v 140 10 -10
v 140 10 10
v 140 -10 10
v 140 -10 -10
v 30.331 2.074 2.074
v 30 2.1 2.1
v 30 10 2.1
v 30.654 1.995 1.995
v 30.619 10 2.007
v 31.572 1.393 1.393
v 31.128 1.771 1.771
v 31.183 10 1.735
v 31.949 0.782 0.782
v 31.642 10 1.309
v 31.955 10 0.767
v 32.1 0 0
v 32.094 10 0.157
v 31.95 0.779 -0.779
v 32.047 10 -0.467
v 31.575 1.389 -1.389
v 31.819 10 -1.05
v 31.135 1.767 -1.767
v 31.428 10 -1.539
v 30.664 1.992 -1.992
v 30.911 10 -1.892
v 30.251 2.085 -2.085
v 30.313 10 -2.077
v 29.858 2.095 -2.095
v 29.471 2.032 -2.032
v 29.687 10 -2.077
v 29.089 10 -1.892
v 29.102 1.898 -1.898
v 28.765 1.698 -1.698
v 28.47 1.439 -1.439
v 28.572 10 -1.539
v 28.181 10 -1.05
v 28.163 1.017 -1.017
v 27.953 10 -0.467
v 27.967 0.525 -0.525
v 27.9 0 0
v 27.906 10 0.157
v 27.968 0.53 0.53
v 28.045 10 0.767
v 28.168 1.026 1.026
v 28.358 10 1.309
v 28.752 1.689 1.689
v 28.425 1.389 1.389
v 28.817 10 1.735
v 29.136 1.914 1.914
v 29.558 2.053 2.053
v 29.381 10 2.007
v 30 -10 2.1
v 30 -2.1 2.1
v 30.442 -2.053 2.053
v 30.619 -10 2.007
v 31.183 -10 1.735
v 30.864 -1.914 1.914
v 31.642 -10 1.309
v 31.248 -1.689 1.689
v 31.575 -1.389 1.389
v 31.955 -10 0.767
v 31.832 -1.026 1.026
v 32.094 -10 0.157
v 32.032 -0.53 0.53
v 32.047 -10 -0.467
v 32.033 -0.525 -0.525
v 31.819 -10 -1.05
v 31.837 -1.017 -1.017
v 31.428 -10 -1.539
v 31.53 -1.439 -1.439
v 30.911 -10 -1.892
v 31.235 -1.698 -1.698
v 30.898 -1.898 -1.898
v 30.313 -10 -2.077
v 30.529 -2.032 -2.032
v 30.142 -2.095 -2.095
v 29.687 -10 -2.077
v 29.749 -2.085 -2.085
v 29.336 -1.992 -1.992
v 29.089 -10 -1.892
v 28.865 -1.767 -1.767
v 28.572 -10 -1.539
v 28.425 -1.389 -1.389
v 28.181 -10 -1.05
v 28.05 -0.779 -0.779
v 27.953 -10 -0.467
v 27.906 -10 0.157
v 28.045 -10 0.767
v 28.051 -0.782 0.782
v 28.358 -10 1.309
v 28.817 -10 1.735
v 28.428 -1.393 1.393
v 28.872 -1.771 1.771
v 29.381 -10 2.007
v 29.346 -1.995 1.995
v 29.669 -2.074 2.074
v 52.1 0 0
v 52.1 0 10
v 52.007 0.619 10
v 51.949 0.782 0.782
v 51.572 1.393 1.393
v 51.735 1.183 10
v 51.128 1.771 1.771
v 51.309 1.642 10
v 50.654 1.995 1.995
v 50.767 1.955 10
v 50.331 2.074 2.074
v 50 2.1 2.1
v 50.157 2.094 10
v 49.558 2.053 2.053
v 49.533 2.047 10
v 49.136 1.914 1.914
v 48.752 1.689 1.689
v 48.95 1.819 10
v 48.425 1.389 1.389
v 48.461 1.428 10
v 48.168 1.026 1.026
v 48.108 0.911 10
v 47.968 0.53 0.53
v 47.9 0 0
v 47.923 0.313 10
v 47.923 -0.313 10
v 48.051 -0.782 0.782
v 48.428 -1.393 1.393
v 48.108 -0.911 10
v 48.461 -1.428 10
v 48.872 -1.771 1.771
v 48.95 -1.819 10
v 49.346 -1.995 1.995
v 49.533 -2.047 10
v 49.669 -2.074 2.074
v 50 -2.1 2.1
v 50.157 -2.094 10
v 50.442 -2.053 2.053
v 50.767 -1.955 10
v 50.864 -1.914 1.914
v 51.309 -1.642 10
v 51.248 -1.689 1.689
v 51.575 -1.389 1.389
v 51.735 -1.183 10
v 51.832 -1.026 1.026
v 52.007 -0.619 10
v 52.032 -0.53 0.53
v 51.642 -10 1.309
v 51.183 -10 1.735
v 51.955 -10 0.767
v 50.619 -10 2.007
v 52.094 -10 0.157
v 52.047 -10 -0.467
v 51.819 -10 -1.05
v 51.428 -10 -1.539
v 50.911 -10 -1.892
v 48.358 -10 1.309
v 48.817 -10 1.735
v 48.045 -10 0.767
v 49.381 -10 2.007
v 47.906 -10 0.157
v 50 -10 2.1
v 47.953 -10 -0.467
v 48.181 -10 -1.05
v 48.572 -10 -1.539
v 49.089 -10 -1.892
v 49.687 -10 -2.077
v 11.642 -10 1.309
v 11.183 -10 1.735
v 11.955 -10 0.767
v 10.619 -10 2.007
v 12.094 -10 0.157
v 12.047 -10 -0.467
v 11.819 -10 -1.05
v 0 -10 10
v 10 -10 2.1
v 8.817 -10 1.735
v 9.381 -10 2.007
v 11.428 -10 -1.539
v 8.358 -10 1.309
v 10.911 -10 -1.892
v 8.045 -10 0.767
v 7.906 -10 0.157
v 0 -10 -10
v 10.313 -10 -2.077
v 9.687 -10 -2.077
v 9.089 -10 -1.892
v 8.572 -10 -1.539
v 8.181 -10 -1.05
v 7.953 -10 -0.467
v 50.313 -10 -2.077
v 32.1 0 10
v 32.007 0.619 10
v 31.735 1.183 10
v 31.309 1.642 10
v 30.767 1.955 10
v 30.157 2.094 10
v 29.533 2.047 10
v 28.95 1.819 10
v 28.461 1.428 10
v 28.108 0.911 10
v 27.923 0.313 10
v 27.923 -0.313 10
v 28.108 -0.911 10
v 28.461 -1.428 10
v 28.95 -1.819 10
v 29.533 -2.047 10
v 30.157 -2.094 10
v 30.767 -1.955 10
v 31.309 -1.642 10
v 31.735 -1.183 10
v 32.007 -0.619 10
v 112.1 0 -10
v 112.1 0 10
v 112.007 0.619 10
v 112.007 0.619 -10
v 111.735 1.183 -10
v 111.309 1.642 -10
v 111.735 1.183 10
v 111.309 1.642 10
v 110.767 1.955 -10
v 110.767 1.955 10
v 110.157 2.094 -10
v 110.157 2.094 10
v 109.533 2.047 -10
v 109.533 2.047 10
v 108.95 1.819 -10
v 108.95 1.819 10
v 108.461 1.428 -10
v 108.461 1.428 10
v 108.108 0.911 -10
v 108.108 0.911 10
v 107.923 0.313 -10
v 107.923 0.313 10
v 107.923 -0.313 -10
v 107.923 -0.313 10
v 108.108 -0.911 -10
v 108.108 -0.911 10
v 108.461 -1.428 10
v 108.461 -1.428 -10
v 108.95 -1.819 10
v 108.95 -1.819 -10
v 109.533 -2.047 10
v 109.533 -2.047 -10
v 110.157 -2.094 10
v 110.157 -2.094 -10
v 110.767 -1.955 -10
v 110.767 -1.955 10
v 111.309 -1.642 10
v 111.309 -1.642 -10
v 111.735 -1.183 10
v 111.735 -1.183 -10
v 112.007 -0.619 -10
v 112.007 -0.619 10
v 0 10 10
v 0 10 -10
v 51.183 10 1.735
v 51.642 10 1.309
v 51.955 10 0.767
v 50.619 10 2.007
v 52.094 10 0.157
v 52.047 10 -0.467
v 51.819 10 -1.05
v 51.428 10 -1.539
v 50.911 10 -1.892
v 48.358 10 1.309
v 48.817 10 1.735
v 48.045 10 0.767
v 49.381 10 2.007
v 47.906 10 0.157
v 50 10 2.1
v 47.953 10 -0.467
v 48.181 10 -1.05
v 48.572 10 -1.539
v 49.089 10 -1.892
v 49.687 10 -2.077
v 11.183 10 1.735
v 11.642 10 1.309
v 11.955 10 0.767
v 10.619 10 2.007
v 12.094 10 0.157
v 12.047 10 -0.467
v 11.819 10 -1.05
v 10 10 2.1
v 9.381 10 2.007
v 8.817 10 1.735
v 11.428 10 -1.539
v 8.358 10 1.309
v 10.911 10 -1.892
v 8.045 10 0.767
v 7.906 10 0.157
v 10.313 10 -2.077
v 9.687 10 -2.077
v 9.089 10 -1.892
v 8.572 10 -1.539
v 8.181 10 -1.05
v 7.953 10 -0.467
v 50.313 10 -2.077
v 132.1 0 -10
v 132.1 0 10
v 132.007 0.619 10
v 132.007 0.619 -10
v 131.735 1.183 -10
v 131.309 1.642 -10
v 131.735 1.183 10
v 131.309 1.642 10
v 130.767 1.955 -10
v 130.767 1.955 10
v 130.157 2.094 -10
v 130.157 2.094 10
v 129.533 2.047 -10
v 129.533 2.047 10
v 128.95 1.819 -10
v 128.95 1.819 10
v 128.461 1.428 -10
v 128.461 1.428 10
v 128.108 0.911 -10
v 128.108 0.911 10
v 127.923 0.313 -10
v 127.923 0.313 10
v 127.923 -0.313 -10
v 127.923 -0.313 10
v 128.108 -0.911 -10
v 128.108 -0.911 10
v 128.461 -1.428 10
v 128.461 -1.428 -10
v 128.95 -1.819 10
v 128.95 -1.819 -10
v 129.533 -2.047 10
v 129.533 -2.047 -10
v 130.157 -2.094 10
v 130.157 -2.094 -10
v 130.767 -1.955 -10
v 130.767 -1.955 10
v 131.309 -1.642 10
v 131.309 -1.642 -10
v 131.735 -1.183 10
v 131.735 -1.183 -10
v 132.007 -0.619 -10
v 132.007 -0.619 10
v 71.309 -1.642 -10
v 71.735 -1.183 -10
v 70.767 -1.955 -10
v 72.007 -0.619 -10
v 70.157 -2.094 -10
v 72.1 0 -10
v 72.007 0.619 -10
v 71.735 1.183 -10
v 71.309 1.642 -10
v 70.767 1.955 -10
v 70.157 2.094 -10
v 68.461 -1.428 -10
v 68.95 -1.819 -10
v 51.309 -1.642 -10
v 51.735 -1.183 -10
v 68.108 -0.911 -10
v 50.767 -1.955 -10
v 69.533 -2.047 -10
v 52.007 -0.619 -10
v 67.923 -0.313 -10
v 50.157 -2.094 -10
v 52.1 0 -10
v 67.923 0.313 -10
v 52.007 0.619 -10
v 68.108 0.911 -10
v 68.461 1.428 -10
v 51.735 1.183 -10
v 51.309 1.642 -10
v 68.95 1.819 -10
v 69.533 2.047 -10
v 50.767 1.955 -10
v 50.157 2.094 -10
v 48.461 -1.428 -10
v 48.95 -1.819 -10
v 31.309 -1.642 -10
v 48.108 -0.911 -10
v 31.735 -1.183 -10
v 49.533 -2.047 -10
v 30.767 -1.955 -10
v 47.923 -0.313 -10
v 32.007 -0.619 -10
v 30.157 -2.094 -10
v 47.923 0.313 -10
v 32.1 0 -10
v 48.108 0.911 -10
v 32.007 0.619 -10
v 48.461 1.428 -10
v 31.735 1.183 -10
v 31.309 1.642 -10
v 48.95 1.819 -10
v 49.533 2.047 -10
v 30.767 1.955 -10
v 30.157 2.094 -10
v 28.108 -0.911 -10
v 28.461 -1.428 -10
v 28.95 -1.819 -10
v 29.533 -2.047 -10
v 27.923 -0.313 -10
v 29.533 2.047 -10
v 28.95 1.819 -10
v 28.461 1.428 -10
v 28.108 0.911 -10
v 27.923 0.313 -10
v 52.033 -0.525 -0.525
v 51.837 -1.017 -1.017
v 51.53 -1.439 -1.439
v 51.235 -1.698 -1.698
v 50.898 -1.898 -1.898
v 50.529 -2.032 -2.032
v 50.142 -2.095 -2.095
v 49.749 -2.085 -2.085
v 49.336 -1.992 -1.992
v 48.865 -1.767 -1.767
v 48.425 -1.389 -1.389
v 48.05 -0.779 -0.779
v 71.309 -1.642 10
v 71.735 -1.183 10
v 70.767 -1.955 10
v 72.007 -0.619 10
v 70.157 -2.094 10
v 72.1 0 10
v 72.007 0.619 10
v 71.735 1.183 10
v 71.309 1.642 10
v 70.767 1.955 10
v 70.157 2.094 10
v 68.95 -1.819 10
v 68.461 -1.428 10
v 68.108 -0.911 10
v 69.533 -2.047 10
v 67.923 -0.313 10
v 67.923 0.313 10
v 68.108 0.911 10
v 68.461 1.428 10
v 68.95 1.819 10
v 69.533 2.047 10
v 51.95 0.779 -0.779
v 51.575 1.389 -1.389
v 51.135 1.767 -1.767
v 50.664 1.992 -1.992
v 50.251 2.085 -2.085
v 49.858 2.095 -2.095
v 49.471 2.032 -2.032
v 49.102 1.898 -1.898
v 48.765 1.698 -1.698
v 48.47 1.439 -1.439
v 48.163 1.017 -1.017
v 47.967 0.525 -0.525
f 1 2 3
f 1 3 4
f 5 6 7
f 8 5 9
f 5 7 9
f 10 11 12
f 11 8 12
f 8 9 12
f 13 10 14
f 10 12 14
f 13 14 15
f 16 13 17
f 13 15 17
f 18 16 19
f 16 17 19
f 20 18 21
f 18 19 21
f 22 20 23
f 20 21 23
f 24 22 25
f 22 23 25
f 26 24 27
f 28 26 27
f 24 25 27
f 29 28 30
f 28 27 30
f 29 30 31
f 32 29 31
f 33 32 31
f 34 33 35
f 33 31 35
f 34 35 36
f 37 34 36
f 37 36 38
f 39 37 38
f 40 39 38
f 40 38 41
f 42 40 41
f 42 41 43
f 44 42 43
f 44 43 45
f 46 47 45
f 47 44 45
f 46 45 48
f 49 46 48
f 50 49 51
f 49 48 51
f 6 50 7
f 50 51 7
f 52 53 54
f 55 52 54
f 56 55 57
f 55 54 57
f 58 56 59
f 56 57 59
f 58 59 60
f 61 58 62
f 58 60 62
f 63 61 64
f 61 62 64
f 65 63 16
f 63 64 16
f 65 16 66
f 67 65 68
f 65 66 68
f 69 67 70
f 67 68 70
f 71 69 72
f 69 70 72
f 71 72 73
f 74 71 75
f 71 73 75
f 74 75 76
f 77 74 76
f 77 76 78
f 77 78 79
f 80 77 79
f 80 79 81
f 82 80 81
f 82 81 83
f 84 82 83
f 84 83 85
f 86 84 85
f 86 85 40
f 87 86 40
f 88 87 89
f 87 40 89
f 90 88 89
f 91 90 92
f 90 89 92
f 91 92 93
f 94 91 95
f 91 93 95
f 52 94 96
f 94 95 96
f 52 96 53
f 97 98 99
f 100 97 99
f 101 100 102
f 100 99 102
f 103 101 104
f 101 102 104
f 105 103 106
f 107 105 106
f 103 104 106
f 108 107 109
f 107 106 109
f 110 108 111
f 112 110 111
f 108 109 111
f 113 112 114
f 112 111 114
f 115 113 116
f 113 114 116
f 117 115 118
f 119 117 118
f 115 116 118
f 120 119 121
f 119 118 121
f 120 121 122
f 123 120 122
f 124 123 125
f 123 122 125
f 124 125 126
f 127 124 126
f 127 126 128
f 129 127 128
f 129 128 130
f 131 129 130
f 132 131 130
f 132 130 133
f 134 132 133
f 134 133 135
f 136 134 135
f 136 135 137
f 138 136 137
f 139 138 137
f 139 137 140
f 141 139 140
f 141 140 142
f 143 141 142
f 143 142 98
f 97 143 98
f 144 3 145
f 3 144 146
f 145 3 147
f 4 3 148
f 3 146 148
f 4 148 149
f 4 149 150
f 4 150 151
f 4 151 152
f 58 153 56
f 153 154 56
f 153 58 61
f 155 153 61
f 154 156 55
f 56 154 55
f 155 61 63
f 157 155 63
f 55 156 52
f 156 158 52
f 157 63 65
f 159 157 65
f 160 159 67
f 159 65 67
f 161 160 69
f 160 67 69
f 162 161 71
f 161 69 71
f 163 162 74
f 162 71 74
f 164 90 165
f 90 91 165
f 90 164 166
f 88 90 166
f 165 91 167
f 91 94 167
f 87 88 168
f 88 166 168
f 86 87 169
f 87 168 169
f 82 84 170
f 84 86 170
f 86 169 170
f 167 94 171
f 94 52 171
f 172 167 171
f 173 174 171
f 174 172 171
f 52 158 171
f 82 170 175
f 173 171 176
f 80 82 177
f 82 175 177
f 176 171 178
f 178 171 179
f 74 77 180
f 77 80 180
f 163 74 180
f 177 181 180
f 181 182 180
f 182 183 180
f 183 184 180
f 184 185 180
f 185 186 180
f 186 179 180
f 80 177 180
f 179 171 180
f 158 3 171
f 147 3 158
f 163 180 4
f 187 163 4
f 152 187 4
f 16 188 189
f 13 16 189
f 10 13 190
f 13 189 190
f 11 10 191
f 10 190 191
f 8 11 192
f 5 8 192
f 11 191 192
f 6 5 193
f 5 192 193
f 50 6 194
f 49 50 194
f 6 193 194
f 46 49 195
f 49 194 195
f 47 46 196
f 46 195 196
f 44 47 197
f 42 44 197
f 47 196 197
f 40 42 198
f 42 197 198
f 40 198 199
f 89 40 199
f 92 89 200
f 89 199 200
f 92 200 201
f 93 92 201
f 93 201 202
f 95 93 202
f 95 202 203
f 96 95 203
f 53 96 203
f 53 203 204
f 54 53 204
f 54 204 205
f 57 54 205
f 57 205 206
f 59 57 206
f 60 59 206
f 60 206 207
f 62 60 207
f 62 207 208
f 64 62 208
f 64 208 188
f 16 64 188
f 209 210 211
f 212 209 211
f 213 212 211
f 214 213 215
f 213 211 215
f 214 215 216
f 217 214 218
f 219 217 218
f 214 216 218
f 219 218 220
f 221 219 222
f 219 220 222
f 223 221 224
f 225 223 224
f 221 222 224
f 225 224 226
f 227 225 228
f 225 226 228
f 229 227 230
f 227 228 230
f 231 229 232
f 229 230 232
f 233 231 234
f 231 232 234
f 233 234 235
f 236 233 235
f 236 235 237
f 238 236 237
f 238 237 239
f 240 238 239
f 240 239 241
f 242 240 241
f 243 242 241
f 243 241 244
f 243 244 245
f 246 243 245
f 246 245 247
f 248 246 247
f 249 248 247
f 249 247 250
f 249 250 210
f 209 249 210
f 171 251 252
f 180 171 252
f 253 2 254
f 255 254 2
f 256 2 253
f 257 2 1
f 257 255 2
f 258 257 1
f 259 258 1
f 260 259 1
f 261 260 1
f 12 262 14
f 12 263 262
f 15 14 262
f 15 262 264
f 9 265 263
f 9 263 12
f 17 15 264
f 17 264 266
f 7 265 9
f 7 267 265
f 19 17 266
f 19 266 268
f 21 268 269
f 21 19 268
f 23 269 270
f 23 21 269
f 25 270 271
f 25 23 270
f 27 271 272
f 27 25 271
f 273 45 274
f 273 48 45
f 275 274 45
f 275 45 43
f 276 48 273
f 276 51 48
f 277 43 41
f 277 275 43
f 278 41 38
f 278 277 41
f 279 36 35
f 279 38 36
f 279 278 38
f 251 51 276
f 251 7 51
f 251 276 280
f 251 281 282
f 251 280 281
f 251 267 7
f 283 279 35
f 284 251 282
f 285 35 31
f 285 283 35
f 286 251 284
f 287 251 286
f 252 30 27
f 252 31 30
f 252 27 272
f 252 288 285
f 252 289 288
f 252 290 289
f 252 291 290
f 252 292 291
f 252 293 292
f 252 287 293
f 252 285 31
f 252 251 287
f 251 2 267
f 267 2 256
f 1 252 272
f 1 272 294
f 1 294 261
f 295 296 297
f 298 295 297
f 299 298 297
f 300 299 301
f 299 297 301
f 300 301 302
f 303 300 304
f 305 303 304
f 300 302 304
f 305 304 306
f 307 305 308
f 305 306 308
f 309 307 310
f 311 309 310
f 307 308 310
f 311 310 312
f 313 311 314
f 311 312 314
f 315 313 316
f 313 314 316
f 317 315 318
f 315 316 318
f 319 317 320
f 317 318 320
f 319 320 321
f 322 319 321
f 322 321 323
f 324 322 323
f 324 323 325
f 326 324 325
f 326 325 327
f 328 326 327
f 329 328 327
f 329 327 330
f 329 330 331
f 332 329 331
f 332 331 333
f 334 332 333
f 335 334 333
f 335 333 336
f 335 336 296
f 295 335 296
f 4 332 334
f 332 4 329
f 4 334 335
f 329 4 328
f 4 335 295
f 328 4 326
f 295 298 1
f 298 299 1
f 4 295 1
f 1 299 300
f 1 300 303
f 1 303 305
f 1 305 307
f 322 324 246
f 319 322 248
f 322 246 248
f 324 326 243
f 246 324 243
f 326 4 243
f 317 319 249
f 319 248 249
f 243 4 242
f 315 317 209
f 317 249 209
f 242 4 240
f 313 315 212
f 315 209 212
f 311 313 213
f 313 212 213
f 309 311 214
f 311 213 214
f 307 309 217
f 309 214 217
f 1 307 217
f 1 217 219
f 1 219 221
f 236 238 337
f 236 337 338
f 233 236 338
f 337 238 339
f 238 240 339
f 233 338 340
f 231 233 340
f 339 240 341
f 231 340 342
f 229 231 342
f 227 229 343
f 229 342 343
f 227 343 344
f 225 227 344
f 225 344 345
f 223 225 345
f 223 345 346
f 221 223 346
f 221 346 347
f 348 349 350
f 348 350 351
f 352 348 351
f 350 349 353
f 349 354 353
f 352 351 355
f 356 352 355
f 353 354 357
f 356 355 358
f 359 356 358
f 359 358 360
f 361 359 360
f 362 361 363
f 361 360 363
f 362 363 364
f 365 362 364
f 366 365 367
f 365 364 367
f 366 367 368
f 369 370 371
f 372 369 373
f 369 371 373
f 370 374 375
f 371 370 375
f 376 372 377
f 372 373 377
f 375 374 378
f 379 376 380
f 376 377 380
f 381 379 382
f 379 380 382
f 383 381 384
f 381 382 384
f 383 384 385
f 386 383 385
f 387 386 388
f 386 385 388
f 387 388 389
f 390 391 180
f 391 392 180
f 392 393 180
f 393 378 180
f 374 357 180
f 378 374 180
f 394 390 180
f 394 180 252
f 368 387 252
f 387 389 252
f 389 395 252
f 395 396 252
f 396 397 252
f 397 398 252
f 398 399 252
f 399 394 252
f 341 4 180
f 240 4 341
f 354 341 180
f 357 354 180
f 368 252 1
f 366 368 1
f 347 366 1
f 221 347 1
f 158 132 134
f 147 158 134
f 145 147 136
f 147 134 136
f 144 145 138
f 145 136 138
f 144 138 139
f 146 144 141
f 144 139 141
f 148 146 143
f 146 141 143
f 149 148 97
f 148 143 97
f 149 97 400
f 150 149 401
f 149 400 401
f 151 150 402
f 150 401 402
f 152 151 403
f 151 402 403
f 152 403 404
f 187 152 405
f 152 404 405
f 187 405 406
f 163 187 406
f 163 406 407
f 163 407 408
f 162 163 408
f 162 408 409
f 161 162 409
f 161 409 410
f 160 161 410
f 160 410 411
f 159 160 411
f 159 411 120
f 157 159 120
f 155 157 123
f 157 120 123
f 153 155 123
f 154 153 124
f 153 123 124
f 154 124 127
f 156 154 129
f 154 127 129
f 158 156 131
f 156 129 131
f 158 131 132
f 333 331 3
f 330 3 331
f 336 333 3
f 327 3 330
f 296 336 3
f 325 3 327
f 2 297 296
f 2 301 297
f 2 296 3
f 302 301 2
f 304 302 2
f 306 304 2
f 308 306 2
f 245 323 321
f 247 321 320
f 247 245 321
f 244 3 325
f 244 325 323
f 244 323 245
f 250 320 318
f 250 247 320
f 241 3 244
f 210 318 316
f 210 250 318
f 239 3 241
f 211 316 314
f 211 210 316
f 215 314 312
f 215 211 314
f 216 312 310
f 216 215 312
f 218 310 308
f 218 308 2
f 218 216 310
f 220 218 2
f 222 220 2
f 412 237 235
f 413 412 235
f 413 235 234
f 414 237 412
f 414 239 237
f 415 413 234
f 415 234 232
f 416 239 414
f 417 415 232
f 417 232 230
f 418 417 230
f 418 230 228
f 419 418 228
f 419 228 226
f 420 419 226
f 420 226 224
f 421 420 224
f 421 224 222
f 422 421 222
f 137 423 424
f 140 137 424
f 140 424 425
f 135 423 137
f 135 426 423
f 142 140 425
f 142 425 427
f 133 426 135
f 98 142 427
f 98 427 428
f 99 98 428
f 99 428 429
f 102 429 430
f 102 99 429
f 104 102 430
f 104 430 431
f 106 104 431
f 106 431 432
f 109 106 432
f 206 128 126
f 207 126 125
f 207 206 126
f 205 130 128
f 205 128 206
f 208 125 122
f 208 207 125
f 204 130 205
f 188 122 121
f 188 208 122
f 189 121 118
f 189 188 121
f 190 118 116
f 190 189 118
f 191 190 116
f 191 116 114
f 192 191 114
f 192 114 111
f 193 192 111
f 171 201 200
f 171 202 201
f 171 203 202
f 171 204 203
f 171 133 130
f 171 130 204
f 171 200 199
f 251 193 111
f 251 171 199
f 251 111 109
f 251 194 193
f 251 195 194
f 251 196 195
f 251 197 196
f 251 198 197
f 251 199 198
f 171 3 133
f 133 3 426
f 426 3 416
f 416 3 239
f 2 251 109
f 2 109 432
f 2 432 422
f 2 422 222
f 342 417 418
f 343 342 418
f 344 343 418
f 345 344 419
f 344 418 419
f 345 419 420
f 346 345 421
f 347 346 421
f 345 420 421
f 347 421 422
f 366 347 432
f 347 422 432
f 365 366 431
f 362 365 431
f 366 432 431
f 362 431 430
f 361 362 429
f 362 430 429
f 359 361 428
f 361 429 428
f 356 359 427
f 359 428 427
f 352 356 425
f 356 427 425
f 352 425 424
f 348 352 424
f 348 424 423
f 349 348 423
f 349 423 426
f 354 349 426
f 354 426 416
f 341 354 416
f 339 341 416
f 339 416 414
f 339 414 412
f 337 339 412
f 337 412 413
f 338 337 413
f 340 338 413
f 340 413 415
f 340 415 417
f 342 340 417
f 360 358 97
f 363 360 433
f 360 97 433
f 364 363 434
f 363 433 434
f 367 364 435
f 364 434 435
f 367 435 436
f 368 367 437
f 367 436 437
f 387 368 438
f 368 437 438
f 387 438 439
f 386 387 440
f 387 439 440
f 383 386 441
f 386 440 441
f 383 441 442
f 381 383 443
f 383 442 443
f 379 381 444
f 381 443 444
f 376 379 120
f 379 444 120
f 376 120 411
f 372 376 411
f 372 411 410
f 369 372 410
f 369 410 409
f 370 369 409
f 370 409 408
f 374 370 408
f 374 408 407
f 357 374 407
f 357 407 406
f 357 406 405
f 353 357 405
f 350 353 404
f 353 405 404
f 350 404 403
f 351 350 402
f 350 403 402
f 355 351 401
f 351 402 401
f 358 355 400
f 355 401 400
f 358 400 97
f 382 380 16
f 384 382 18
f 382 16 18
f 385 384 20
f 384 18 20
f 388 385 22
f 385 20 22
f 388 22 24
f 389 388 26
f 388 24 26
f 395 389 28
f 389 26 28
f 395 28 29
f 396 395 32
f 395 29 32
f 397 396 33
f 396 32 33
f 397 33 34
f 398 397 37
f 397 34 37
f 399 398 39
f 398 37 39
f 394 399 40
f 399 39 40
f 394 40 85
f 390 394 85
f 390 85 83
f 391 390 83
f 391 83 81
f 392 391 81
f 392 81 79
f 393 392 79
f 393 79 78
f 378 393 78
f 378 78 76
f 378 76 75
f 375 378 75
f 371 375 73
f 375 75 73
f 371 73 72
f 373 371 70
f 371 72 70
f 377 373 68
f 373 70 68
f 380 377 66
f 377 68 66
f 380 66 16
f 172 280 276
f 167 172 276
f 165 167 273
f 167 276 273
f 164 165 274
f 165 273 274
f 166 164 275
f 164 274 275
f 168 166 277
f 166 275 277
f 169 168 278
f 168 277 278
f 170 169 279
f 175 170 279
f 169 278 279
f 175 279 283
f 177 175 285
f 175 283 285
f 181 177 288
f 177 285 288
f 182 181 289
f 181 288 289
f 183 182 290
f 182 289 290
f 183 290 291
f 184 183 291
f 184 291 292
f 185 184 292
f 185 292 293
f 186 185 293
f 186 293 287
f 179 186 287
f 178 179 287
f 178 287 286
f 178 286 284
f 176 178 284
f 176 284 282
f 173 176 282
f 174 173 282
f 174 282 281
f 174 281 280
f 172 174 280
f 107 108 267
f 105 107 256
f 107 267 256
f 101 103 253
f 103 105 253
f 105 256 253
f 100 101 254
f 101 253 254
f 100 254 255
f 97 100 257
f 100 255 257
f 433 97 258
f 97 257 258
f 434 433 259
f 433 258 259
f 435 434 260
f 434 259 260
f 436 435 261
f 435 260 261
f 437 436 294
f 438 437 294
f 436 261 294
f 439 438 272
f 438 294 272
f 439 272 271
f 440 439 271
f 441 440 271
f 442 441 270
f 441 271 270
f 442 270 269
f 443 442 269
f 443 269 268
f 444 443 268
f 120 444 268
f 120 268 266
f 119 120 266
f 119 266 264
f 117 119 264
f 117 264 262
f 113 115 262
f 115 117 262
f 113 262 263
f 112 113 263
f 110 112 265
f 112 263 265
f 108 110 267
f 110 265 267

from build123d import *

# Parameters (mm, degrees)
SKETCH_1_W          = 20
SKETCH_1_H          = 20
EXTRUDE_1_DEPTH     = 140
SKETCH_3_R          = 2.1
CUT_EXTRUDE_1_DEPTH = 142.774468788
SKETCH_2_R          = 2.1
CUT_EXTRUDE_2_DEPTH = 142.774468788


with BuildPart() as part:
    # 草图1 → 凸台-拉伸1 (new body)
    with BuildSketch(Plane(origin=(0, 0, 0), x_dir=(0, 0, -1), z_dir=(1, 0, 0))):
        Rectangle(SKETCH_1_W, SKETCH_1_H)
    extrude(amount=EXTRUDE_1_DEPTH)

    # 草图3 → 切除-拉伸1 (cut, through all)
    with BuildSketch(Plane.XY.offset(10)):
        with Locations((30, 0)):
            Circle(SKETCH_3_R)
        with Locations((50, 0)):
            Circle(SKETCH_3_R)
        with Locations((70, 0)):
            Circle(SKETCH_3_R)
        with Locations((130, 0)):
            Circle(SKETCH_3_R)
        with Locations((110, 0)):
            Circle(SKETCH_3_R)
    extrude(amount=-CUT_EXTRUDE_1_DEPTH, mode=Mode.SUBTRACT)

    # 草图2 → 切除-拉伸2 (cut, through all)
    with BuildSketch(Plane(origin=(0, 10, 0), x_dir=(1, 0, 0), z_dir=(0, 1, 0))):
        with Locations(Location((10, 0, 0), (0, 0, 270))):
            Circle(SKETCH_2_R)
        with Locations(Location((30, 0, 0), (0, 0, 270))):
            Circle(SKETCH_2_R)
        with Locations(Location((50, 0, 0), (0, 0, 270))):
            Circle(SKETCH_2_R)
    extrude(amount=-CUT_EXTRUDE_2_DEPTH, mode=Mode.SUBTRACT)


solid = part.part
